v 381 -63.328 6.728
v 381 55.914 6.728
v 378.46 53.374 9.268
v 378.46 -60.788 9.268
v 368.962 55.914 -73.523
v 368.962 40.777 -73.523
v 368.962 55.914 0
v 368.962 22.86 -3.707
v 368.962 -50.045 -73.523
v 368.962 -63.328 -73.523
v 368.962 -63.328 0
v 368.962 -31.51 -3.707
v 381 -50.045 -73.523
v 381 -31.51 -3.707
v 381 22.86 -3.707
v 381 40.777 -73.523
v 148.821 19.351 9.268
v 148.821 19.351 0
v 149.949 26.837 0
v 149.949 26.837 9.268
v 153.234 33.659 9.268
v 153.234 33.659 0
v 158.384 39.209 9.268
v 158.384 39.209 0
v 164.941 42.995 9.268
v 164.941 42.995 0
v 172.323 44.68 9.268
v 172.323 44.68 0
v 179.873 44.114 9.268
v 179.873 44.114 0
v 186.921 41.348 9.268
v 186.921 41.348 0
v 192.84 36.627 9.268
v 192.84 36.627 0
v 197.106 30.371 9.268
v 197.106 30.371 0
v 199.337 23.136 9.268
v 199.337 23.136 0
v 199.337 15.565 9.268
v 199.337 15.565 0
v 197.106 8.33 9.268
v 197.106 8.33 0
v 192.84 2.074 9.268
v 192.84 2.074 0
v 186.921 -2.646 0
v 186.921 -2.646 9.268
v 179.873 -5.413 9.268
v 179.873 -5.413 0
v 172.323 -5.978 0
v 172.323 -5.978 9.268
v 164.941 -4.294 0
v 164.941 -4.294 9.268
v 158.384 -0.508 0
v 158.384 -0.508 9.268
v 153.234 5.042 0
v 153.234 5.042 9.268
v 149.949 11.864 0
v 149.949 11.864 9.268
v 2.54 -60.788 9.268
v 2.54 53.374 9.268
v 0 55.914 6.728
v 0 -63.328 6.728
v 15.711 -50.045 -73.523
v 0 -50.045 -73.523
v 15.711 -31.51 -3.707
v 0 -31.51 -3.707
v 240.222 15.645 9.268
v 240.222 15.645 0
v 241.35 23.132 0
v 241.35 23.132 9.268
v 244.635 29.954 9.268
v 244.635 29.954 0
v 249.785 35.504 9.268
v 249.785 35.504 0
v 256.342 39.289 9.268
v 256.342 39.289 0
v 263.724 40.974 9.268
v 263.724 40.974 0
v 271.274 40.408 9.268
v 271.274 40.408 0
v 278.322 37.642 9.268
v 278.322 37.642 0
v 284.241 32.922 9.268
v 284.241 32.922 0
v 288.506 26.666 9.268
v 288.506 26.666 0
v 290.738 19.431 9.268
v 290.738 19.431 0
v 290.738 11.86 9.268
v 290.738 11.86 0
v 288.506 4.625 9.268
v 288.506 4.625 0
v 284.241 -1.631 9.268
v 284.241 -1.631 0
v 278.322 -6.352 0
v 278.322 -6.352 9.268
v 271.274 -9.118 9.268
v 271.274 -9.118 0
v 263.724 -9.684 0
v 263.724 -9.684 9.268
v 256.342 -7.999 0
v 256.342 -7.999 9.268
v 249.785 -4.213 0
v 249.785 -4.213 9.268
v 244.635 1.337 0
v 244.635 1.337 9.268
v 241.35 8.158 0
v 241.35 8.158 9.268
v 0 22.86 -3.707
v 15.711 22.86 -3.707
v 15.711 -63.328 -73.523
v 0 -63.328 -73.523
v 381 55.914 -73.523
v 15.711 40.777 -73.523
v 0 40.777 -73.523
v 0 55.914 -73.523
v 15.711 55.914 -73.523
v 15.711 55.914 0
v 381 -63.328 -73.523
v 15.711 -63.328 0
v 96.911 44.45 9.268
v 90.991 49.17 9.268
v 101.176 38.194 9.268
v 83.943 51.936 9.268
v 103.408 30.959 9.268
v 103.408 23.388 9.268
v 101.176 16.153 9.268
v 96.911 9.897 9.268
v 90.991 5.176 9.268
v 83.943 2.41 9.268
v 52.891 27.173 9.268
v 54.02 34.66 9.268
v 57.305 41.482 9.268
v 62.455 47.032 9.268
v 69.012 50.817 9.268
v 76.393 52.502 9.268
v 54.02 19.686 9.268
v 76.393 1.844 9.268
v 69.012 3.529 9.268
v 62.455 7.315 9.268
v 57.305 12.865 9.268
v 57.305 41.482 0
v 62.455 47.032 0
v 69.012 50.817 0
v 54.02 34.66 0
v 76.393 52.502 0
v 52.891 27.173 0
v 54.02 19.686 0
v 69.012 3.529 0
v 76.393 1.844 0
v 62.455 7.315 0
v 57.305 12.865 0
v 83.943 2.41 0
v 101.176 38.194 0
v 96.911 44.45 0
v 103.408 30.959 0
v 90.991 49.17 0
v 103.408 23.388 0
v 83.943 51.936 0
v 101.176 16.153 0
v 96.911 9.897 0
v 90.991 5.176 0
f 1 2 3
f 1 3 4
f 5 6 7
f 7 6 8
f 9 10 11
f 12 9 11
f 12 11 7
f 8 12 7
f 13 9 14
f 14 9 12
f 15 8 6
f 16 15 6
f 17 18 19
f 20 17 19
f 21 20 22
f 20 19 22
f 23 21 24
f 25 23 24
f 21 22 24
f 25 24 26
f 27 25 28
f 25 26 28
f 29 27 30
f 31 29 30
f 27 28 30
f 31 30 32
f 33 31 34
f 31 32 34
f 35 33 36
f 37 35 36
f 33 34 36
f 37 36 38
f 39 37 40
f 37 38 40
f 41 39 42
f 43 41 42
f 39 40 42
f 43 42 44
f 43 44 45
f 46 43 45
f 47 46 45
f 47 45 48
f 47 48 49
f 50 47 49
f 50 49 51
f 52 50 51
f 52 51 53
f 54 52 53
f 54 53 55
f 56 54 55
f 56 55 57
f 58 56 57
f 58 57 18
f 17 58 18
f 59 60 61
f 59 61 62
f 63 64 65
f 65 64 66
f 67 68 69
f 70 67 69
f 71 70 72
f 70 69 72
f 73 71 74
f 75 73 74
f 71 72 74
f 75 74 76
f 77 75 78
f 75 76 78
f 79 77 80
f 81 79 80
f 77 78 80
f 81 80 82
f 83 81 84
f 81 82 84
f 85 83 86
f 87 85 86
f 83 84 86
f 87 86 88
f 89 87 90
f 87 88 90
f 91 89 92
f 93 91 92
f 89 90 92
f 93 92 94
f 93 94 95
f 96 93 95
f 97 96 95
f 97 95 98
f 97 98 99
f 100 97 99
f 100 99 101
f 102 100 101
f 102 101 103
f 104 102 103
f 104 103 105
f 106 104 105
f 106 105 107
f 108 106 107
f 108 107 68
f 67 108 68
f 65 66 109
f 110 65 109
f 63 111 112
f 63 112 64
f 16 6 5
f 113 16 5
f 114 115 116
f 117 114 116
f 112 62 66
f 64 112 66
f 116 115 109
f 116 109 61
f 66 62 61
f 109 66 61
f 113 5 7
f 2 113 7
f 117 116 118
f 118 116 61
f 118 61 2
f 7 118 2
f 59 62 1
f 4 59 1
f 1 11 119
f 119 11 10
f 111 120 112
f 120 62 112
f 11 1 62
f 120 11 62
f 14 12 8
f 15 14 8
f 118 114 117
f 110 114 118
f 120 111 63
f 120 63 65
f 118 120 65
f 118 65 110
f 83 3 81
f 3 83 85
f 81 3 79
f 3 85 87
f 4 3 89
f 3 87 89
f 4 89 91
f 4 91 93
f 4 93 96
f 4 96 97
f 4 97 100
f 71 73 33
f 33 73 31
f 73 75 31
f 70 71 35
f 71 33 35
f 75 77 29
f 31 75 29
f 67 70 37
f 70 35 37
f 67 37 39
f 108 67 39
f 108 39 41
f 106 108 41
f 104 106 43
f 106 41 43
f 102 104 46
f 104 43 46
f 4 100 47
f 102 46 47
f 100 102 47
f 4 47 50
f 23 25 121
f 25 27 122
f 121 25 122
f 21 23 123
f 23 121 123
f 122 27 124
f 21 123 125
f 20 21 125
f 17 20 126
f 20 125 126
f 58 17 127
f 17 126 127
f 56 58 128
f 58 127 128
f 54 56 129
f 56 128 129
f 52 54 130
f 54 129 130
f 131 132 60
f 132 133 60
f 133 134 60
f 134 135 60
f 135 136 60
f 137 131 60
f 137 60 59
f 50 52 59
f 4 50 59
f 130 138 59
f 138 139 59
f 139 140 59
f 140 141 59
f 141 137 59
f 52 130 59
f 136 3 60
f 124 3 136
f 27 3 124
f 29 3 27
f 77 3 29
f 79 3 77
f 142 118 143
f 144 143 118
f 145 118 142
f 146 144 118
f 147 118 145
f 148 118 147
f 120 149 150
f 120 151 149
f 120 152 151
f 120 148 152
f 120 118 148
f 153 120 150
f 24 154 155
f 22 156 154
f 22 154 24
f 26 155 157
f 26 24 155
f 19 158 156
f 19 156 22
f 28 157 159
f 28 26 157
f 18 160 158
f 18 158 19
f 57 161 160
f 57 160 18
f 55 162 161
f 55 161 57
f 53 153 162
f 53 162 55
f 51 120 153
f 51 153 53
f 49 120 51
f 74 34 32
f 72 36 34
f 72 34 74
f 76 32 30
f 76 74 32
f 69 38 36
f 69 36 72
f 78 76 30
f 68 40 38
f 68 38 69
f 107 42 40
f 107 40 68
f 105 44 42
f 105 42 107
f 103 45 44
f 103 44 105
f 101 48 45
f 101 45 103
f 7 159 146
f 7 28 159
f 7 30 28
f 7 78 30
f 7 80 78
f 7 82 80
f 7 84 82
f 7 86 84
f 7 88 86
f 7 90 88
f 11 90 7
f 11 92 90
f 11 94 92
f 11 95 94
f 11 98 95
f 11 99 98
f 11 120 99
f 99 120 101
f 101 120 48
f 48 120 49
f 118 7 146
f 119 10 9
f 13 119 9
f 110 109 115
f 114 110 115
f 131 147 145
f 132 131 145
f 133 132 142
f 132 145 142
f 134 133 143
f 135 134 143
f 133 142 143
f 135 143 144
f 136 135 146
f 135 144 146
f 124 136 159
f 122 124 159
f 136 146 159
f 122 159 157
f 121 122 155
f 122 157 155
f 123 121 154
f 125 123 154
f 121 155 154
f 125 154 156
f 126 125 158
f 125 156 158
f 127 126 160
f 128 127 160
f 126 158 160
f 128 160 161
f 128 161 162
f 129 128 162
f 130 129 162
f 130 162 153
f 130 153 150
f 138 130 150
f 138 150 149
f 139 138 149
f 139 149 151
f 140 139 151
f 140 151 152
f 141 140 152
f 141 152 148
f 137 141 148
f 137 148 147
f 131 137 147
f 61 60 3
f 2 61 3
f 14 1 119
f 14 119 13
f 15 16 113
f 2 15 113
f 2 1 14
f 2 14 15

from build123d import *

# Parameters (mm, degrees)
F1_DEPTH = 381
F2_W     = 353.251727
F2_H     = 73.522702
F3_DEPTH = 119.243709
F4_SIZE  = 2.54
F6_D     = 50.8


with BuildPart() as f1:
    # F0 (on Right) → F1 (new body)
    with BuildSketch(Plane.YZ):
        Polygon((22.86, -3.707027), (40.7773, -73.522702), (55.914324, -73.522702), (55.914324, 9.267568), (-63.328385, 9.267568), (-63.328385, -73.522702), (-50.044864, -73.522702), (-31.509727, -3.707027), align=None)
    extrude(amount=F1_DEPTH)

    # F2 (on face) → F3 (cut, through all)
    with BuildSketch(Plane.XZ.offset(63.328385)):
        with Locations((192.336394, -36.761351)):
            Rectangle(F2_W, F2_H)
    extrude(amount=-F3_DEPTH, mode=Mode.SUBTRACT)

    # F4
    f4_edges = [f1.edges().sort_by_distance(p)[0] for p in [
        (381, -3.707031, 9.267568),
        (190.5, -63.328385, 9.267568),
        (190.5, 55.914324, 9.267568),
        (0, -3.707031, 9.267568),
    ]]
    chamfer(f4_edges, length=F4_SIZE)

    # F6 (through all)
    with Locations(Plane.XY.offset(9.267568)):
        with Locations((78.291252, 27.173208), (174.22092, 19.350618), (265.621692, 15.64518)):
            Hole(F6_D / 2)


solid = f1.part
